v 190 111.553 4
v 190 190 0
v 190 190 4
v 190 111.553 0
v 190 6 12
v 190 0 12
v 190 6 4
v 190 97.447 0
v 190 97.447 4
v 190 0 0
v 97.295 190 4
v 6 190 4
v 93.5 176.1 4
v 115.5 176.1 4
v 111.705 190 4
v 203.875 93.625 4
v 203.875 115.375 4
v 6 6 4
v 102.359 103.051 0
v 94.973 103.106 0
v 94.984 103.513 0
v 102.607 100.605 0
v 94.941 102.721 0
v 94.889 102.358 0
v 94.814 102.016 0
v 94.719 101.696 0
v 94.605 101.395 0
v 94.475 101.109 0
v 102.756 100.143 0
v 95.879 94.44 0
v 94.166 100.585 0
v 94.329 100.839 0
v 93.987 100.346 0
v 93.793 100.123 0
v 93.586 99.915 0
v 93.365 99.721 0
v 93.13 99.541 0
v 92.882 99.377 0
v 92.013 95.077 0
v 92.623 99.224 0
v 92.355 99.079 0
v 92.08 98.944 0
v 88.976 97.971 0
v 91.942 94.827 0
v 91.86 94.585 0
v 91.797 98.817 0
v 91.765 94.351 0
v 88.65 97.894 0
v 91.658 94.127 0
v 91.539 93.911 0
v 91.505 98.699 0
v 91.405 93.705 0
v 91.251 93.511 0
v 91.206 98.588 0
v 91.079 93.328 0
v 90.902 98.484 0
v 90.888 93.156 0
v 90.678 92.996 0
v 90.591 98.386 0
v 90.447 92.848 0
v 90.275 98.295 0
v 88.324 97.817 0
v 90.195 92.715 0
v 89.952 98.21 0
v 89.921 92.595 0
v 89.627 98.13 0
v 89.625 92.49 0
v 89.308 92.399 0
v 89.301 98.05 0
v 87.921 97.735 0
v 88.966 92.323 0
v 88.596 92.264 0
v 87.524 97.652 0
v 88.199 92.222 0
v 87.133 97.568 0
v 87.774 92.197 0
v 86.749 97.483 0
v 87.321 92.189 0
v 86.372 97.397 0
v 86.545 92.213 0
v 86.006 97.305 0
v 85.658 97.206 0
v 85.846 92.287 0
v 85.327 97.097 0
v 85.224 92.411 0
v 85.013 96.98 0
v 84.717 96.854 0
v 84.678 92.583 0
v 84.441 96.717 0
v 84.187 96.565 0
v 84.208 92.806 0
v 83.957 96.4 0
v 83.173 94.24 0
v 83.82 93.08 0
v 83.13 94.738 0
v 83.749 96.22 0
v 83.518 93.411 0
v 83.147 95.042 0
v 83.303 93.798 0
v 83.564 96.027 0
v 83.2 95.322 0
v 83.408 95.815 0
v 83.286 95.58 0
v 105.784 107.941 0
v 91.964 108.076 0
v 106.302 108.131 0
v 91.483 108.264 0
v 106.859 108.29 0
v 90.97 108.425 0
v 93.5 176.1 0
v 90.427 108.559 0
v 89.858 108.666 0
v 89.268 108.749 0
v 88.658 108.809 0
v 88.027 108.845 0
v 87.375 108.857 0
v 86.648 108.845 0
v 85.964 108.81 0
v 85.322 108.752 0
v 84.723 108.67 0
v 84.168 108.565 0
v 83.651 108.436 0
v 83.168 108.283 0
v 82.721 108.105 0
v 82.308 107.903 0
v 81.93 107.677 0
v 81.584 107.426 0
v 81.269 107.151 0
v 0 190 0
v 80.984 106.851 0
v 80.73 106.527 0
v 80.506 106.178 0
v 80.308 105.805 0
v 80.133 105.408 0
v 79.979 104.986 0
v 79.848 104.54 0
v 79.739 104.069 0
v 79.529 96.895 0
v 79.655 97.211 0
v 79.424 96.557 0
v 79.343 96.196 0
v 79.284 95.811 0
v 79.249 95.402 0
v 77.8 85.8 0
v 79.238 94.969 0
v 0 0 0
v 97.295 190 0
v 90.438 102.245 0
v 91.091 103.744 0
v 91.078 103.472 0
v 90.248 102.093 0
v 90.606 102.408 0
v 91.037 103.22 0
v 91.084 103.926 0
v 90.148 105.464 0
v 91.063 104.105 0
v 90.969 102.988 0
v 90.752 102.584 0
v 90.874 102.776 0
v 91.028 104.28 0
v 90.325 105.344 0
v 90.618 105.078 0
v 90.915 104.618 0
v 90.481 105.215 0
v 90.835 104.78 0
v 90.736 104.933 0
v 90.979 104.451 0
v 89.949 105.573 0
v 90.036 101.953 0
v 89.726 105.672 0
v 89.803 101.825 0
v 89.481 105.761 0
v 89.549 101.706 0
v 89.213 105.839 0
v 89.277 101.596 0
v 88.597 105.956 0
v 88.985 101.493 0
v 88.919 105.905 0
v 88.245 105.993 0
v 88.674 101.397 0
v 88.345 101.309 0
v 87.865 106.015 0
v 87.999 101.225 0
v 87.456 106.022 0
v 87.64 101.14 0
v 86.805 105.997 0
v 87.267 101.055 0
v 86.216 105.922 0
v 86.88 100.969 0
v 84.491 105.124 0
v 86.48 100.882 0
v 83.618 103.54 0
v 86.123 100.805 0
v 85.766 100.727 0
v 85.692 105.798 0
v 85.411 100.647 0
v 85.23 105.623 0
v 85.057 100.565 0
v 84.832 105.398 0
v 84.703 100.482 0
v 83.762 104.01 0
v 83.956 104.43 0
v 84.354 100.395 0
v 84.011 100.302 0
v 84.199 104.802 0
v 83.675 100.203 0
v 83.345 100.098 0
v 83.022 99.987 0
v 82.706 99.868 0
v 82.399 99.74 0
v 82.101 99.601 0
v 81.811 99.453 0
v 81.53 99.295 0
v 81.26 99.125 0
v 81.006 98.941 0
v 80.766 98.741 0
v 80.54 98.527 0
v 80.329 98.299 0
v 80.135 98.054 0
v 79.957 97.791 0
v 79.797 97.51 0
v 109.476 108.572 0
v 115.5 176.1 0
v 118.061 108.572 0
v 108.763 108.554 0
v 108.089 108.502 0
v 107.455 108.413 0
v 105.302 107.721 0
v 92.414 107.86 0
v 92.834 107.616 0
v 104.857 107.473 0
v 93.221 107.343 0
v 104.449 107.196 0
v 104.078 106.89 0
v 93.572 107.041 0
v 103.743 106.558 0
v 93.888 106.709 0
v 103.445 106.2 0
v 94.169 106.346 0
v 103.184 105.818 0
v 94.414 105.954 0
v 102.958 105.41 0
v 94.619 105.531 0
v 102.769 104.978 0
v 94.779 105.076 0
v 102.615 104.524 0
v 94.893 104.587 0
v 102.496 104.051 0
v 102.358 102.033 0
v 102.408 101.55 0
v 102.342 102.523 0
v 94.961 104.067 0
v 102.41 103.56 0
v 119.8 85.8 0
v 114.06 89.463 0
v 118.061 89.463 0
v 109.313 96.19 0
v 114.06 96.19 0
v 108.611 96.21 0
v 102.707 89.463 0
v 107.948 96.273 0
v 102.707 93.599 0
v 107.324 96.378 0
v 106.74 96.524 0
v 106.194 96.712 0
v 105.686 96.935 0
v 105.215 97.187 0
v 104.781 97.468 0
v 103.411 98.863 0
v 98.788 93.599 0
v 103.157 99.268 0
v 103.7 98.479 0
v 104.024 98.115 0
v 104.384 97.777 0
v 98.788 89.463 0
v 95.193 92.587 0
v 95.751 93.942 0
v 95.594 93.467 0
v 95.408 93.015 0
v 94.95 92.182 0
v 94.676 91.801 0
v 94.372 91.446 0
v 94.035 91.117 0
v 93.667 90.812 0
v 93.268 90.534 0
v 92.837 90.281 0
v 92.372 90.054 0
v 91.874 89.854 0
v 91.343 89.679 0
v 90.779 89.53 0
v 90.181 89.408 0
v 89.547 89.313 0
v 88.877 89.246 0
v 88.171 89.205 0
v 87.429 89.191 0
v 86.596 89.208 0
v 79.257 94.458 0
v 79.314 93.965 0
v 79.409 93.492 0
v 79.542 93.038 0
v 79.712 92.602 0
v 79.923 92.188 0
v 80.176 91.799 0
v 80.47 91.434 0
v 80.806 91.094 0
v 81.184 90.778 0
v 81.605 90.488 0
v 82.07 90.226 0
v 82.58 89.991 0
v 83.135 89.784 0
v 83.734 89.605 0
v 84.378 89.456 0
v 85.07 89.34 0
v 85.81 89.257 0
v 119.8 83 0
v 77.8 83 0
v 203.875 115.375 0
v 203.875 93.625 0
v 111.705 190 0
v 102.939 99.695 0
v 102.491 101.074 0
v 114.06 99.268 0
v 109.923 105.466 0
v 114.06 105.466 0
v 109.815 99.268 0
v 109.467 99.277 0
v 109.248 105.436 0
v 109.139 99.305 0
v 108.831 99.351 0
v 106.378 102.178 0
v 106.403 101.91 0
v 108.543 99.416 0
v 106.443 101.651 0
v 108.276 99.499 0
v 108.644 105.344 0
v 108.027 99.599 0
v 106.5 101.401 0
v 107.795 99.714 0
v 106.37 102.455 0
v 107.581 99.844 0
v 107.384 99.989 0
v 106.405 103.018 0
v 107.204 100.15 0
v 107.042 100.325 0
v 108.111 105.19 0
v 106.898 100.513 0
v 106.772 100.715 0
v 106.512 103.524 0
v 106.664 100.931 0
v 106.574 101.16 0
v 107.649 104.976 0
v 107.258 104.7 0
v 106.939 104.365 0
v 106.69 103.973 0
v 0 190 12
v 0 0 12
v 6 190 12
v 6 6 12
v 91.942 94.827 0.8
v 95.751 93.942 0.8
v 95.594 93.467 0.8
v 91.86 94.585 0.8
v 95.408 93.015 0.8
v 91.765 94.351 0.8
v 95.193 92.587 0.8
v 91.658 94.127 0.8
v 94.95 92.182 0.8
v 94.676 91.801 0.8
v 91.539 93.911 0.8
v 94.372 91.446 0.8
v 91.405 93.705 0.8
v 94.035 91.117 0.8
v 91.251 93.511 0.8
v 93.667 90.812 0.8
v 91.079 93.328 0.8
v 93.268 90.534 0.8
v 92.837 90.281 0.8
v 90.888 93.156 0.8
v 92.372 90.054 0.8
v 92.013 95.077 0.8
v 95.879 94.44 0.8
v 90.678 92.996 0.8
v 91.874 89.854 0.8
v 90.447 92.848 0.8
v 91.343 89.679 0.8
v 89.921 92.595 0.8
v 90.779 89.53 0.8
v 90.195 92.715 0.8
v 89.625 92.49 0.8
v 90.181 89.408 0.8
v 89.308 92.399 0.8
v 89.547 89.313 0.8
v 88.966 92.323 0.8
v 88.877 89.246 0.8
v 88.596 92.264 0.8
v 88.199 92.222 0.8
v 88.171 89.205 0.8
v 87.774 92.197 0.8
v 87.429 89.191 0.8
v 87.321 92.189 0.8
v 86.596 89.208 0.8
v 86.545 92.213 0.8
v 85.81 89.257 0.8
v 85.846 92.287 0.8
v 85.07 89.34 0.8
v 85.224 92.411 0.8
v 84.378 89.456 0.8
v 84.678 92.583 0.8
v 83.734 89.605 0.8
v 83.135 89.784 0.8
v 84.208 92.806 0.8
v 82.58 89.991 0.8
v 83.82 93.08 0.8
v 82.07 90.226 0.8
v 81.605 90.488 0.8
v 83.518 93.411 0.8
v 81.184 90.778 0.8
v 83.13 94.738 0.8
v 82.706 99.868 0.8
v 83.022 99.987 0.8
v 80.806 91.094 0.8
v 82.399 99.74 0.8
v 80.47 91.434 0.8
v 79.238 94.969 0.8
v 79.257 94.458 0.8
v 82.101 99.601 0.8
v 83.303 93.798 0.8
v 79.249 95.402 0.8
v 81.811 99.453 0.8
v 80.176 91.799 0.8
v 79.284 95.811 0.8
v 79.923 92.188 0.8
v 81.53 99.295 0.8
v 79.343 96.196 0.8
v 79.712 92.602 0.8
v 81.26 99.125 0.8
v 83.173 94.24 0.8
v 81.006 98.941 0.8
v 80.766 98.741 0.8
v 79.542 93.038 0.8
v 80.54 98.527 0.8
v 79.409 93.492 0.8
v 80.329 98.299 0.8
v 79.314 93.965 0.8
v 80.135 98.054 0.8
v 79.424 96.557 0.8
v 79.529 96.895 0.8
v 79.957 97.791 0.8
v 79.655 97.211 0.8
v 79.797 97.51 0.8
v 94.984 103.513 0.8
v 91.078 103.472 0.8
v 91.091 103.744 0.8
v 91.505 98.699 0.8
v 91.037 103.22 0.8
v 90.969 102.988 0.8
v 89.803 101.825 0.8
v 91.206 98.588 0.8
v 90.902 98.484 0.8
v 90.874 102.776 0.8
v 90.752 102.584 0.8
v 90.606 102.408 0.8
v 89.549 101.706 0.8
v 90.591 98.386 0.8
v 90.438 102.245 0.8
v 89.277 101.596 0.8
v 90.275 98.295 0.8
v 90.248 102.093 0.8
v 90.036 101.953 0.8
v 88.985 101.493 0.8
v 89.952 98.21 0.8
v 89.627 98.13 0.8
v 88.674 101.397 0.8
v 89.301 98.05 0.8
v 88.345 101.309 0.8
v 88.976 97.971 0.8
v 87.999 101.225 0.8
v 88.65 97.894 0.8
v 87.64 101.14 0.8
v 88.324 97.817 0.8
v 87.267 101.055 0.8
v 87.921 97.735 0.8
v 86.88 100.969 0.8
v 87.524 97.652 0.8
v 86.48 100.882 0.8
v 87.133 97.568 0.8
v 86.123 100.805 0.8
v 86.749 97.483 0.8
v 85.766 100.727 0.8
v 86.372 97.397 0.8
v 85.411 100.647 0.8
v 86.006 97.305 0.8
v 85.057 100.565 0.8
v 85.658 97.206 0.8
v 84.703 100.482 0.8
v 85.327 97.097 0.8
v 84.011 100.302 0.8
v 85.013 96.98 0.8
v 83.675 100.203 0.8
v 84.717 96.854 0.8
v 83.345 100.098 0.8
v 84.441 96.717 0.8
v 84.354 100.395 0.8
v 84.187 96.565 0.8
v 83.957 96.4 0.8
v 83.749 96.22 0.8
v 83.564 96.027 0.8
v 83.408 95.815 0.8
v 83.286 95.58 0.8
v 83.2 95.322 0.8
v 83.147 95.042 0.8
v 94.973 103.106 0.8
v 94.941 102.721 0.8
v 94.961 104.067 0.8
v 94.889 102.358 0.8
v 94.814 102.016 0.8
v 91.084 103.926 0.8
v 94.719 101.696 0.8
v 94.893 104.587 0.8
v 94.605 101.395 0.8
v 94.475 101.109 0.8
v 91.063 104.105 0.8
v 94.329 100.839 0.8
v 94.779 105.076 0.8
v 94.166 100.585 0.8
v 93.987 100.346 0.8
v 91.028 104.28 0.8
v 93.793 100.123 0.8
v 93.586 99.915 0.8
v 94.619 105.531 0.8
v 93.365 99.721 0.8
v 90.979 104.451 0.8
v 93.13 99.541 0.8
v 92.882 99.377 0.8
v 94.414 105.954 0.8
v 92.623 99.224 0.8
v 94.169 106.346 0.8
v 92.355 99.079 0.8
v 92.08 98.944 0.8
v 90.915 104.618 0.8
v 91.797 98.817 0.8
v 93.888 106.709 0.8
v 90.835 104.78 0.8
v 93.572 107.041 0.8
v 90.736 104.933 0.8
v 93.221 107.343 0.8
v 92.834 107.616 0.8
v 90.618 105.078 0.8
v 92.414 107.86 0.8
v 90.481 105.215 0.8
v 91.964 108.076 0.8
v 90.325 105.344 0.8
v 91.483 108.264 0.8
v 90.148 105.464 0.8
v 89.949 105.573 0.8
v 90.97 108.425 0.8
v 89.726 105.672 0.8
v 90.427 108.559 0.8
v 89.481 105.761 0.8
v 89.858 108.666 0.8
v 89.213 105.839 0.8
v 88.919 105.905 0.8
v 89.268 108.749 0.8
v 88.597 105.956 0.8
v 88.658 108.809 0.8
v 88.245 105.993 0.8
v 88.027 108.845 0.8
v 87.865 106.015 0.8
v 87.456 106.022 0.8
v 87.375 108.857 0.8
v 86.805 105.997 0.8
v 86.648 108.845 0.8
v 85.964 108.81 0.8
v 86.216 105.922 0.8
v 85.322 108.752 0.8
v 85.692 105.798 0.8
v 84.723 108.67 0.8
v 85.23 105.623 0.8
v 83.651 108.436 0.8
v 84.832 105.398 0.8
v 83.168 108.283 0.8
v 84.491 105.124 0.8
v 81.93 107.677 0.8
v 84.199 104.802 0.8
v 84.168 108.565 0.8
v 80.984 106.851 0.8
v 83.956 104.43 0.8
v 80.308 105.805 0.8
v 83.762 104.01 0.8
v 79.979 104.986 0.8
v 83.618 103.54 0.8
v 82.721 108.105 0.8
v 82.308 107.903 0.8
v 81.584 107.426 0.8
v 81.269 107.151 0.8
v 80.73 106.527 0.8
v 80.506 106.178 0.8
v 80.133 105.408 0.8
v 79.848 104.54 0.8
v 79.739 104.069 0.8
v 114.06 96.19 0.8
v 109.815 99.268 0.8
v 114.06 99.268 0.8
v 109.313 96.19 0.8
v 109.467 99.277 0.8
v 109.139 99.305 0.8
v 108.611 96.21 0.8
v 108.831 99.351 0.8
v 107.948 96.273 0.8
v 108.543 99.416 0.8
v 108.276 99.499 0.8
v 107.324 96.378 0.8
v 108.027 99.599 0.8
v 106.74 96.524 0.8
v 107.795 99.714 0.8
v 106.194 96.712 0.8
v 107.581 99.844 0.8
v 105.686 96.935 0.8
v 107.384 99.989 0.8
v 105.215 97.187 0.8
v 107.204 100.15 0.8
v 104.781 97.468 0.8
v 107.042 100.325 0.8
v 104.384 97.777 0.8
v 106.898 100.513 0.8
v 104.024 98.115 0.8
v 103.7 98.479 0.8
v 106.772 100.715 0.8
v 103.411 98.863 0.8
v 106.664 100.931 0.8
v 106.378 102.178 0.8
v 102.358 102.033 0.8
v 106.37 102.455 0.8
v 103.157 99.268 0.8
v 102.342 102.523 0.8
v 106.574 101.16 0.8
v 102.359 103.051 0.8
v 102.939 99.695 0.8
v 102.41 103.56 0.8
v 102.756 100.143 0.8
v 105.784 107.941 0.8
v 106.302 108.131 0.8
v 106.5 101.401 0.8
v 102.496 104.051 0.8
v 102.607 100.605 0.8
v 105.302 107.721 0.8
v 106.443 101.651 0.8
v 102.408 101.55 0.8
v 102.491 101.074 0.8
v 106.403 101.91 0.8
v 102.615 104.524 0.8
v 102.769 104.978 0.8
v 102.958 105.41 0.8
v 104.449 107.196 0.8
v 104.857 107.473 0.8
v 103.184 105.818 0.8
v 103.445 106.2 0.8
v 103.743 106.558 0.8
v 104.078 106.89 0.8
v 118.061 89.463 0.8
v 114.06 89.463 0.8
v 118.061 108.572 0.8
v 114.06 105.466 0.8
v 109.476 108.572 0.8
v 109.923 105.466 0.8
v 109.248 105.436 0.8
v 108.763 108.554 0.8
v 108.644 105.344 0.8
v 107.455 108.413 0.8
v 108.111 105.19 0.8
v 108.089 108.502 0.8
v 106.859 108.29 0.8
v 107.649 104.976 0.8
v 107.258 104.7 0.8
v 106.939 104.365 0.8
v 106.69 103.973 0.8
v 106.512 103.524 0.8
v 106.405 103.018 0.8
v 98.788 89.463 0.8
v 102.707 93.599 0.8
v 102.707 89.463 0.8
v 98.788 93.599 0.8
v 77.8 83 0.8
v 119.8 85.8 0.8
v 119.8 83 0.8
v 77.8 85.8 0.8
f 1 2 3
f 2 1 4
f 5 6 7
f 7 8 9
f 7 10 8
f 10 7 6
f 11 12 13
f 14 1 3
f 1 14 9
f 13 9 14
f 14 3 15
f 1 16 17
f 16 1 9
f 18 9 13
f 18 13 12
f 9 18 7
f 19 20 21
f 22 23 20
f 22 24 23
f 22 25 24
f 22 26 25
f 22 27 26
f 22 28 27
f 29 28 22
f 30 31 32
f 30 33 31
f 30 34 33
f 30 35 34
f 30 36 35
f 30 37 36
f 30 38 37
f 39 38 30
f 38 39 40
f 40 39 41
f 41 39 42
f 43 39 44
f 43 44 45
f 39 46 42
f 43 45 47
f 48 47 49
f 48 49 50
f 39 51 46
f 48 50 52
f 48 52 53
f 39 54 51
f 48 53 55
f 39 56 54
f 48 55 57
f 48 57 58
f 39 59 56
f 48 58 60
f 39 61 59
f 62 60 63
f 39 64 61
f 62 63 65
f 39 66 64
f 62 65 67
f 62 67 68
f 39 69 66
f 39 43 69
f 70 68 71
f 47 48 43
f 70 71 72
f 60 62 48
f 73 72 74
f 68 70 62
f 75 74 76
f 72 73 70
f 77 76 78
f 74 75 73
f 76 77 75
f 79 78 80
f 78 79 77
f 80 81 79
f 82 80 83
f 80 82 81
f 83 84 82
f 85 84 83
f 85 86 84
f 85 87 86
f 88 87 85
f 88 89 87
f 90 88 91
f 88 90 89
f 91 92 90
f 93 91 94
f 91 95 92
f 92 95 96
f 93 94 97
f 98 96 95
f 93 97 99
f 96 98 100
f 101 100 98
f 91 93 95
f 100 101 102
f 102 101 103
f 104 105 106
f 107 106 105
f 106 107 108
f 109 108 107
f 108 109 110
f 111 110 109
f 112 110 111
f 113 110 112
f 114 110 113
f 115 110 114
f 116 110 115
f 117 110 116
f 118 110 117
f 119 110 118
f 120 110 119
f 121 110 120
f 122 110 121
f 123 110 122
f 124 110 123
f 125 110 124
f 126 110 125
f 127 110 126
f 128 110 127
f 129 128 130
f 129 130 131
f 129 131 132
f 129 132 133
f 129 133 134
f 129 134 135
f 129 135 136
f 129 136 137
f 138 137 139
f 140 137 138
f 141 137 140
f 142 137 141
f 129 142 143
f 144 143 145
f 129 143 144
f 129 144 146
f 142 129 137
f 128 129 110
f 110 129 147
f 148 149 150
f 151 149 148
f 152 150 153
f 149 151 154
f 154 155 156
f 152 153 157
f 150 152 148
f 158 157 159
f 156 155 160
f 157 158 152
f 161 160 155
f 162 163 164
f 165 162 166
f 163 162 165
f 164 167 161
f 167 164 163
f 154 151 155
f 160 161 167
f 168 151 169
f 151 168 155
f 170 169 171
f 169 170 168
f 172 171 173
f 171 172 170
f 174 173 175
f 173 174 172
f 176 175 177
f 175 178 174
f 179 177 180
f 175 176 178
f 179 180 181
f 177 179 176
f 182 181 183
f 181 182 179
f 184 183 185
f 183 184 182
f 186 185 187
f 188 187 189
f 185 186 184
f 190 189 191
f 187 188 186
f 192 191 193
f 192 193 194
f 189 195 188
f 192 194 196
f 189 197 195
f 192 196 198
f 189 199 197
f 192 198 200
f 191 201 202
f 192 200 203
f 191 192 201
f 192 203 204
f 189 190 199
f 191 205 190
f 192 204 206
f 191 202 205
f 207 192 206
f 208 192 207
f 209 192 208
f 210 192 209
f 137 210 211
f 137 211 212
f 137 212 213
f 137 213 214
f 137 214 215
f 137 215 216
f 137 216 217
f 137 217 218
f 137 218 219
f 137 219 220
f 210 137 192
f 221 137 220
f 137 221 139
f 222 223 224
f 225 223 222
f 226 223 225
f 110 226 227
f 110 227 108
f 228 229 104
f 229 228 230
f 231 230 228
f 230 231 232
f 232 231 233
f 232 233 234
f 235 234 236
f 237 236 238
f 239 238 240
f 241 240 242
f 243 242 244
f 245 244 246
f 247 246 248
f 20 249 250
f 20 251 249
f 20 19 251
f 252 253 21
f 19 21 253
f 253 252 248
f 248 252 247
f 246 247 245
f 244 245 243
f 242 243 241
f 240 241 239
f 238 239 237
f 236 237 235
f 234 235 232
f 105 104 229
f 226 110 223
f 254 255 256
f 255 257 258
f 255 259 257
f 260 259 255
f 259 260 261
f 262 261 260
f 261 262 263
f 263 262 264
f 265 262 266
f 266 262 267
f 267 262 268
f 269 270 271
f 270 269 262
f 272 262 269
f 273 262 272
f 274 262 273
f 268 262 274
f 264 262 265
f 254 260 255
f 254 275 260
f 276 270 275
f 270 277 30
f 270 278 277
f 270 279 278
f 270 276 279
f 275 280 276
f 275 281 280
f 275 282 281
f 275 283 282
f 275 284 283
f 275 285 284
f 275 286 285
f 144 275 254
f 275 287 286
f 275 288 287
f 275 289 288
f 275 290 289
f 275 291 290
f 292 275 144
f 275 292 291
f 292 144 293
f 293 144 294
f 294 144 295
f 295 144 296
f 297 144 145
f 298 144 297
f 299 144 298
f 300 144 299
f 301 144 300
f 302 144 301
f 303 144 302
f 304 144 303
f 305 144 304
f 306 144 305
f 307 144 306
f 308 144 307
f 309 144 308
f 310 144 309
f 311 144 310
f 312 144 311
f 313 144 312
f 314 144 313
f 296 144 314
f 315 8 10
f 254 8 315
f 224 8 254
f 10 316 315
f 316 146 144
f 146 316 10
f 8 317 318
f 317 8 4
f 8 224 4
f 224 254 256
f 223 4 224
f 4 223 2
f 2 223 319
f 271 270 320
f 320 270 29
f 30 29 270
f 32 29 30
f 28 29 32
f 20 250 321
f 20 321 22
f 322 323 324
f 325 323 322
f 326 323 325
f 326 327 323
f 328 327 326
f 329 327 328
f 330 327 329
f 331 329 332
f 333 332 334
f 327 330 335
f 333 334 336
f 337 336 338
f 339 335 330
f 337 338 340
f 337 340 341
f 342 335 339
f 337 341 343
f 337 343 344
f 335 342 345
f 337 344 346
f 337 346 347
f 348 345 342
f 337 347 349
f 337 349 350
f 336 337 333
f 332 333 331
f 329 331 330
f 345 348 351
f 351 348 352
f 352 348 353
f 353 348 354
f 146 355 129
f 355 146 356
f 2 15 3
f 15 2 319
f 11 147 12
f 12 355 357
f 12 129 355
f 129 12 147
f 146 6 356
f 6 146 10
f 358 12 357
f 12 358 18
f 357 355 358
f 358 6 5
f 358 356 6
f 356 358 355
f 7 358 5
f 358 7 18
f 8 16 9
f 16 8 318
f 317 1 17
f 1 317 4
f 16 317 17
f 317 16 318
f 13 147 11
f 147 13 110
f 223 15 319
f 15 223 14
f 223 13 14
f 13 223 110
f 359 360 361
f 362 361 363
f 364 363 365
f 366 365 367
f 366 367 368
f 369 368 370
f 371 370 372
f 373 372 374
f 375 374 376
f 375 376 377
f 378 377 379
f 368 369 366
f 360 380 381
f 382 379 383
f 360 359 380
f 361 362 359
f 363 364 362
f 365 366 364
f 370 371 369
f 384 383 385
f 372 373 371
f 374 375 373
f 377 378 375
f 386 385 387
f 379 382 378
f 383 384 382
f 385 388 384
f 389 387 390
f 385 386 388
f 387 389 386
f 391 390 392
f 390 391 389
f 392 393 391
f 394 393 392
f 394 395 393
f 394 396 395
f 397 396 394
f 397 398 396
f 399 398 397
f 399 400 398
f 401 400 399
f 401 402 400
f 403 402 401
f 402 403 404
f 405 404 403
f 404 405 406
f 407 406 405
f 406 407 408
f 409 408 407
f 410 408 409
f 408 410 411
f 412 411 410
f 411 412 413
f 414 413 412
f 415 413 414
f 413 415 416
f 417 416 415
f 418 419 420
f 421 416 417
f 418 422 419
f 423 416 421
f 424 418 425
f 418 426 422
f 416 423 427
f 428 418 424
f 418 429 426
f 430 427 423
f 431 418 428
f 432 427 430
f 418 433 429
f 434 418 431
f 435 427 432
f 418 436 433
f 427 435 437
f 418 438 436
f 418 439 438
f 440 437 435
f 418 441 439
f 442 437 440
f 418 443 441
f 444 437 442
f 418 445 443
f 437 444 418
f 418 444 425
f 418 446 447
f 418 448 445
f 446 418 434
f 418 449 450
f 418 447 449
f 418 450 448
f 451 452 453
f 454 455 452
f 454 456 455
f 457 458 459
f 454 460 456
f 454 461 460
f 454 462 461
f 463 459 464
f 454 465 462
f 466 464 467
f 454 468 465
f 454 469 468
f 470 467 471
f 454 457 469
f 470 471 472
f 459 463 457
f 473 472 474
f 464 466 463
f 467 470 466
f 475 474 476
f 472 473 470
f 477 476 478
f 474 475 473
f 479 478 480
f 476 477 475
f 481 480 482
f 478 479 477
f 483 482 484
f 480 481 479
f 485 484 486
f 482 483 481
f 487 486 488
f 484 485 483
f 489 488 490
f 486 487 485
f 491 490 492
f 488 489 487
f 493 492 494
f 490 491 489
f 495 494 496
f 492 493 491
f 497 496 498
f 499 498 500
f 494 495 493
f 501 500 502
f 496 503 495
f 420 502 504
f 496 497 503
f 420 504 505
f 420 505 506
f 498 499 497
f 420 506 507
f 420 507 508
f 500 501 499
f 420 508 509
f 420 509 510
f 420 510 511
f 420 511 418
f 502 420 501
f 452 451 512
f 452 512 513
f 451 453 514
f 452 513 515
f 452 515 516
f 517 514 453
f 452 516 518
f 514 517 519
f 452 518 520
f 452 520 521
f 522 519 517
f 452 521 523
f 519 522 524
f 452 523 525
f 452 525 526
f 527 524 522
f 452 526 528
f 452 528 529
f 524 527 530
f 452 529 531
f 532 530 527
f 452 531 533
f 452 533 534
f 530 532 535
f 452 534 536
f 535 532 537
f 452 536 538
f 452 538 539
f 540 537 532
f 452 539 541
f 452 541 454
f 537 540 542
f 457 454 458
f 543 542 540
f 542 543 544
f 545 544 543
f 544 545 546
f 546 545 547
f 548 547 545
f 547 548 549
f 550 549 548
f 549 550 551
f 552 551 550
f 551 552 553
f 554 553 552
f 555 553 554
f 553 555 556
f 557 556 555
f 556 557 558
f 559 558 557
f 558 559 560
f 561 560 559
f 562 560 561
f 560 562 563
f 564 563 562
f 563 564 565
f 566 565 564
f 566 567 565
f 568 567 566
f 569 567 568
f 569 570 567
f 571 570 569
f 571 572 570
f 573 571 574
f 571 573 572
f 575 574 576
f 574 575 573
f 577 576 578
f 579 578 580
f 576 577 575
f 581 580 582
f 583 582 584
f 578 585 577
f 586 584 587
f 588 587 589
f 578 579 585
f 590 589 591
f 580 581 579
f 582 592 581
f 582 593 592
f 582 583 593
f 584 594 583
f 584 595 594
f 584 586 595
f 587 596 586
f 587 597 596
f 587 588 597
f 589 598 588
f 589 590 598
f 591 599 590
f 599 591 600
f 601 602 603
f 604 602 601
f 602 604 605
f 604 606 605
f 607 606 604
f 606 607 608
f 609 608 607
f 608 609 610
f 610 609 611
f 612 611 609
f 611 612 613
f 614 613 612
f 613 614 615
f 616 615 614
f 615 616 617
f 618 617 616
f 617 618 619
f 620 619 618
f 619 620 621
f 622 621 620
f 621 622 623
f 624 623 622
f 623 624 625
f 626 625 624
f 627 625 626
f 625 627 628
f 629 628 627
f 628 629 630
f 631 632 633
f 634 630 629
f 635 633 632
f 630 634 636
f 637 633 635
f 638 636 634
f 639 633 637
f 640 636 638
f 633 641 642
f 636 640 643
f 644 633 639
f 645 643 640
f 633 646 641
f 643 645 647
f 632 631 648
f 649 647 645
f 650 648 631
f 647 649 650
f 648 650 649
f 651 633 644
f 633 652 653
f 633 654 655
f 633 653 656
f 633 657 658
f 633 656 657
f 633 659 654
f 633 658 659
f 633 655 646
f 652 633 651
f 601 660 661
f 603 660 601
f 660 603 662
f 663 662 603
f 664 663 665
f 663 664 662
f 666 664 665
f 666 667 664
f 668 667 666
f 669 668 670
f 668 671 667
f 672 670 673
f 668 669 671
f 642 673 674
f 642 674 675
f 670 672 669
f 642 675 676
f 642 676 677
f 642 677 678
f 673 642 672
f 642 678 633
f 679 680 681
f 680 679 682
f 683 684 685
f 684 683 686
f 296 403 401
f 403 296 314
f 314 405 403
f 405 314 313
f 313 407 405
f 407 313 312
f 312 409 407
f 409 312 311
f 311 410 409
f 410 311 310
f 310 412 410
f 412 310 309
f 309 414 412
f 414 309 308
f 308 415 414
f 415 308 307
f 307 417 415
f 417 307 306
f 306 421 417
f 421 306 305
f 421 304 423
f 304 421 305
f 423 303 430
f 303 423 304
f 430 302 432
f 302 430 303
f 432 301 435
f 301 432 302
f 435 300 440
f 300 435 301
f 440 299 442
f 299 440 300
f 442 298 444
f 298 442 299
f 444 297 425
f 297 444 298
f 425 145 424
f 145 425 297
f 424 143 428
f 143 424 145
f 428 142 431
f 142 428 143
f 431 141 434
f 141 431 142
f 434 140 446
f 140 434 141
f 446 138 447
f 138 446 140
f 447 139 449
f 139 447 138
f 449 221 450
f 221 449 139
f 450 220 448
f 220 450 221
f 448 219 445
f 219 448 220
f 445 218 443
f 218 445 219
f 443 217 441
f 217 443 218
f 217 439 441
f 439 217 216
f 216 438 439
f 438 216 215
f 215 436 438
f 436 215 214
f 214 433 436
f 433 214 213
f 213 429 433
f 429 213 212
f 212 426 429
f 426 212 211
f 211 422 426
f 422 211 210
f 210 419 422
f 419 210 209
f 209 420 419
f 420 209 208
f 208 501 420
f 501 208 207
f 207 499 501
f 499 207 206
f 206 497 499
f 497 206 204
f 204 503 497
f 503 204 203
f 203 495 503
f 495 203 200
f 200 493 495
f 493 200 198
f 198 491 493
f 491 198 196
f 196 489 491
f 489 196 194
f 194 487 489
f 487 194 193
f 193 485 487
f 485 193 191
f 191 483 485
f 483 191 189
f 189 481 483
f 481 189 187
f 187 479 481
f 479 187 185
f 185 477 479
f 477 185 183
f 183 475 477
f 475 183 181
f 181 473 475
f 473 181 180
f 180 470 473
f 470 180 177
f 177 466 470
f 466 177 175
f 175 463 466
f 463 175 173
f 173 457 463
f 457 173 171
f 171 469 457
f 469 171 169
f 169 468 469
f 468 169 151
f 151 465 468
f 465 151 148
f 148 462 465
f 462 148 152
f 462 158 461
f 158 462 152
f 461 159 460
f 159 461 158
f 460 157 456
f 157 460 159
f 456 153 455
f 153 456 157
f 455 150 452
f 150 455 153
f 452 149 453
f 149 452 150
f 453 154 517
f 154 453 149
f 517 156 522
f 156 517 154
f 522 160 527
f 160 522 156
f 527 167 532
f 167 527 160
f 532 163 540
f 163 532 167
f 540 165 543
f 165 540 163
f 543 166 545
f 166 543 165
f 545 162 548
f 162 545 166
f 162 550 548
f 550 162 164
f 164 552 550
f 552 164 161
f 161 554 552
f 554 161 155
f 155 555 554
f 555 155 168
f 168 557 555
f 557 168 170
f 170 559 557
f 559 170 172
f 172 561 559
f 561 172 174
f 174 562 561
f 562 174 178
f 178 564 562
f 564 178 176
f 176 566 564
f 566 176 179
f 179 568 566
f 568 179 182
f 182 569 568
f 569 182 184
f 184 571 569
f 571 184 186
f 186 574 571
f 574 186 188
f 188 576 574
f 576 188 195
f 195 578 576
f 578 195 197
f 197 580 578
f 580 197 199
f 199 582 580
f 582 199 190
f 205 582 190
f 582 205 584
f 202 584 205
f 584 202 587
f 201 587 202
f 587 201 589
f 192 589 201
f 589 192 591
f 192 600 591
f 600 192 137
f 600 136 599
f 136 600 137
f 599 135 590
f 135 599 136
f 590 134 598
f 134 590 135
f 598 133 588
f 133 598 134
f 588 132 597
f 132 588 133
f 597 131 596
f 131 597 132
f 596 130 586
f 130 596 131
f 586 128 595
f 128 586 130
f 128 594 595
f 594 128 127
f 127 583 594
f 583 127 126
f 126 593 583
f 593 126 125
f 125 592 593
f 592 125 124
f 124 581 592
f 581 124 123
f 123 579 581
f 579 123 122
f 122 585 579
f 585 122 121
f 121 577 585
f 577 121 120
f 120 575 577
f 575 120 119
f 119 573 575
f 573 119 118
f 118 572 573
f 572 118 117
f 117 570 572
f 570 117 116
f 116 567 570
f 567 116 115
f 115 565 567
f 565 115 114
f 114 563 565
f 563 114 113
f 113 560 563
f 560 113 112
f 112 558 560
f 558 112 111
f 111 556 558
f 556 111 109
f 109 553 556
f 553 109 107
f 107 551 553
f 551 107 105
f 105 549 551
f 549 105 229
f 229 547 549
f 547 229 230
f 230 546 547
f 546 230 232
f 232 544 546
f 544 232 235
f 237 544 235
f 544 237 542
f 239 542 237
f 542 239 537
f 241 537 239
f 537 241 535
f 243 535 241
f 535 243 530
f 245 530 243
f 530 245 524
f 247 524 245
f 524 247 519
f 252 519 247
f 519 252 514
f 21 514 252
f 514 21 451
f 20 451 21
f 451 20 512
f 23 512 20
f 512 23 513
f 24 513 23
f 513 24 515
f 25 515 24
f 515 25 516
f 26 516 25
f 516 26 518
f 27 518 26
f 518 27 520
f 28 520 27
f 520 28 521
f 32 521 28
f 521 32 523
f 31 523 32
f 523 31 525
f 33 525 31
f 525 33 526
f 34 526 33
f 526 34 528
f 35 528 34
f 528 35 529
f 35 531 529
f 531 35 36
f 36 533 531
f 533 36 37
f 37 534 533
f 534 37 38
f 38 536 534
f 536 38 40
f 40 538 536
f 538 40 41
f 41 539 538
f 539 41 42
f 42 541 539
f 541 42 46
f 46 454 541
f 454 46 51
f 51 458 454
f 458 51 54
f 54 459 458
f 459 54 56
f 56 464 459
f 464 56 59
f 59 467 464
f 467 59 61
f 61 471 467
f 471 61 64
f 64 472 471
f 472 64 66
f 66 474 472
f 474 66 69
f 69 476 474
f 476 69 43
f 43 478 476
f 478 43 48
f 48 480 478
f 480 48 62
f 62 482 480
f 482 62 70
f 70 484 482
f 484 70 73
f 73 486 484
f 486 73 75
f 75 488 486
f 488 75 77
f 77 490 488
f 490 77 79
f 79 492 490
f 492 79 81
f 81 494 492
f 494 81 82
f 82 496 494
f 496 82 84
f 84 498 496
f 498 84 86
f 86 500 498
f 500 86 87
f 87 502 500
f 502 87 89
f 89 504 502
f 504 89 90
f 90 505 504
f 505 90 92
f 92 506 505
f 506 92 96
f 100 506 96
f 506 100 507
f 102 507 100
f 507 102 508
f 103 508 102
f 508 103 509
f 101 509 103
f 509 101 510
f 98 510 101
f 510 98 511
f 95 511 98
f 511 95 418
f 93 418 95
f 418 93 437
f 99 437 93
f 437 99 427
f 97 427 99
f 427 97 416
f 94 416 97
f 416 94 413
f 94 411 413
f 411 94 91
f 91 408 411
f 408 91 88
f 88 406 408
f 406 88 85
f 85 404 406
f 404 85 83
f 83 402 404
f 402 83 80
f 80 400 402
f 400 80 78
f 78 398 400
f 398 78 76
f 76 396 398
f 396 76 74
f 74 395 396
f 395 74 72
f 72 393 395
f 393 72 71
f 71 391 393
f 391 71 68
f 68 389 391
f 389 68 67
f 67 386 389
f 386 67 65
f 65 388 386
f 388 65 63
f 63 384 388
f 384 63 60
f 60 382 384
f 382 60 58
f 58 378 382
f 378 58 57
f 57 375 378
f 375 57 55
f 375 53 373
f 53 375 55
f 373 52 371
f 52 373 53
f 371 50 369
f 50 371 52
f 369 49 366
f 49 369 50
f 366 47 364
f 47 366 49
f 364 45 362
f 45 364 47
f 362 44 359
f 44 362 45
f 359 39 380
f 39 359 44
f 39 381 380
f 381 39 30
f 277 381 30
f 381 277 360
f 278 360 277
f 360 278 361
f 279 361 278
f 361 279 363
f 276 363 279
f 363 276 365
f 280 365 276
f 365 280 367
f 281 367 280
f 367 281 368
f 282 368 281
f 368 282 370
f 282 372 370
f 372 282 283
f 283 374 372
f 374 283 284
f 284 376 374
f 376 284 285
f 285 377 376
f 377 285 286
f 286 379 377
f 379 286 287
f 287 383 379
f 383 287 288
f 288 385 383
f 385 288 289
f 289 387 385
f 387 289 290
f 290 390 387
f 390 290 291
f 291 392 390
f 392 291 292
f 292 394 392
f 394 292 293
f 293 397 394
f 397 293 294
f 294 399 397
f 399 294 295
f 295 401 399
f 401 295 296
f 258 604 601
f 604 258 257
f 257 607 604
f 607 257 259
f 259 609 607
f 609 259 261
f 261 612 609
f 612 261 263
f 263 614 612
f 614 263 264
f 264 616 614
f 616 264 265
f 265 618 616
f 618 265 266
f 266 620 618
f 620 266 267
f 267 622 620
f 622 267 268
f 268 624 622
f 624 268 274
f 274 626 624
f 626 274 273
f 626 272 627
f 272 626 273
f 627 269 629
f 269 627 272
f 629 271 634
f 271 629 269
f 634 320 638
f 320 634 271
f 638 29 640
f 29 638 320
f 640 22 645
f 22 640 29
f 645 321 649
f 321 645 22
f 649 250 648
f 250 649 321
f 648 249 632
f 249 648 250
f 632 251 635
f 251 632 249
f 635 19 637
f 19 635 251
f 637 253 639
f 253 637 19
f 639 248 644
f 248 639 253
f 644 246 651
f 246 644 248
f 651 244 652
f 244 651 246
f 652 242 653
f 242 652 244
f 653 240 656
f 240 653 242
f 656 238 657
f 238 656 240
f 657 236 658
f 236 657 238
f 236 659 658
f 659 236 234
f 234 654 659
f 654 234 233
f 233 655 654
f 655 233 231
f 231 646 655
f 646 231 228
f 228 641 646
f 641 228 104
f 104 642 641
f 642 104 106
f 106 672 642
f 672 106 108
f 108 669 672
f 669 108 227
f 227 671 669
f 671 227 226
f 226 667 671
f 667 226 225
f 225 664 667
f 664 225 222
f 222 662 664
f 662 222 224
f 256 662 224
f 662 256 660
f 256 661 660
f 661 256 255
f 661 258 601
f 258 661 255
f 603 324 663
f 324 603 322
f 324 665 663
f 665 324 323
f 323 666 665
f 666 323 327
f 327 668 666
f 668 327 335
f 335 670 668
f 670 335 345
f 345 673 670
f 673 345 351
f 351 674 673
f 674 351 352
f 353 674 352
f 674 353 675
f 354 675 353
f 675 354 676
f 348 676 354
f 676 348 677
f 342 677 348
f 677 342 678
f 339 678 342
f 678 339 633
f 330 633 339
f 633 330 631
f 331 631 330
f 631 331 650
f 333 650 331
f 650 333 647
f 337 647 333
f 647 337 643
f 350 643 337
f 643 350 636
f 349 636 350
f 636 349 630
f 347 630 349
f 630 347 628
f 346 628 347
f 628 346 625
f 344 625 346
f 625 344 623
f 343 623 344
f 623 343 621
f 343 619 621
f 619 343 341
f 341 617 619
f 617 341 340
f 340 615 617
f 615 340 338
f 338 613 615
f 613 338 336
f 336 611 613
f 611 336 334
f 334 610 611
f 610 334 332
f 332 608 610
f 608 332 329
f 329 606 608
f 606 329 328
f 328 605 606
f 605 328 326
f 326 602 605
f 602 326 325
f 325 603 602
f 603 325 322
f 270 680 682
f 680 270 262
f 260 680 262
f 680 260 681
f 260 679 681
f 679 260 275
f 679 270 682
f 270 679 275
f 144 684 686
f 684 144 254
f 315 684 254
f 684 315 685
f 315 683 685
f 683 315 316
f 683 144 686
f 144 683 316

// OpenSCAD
// ============================================================================
// P.S (Plastic Shane) — 4-Piece Interlocking Carpet Tray for Flashforge AD5X
// Fits 363x363mm AD5X footprint | Prints on 220x220mm bed | Dual-Colour P.S Logo
// ============================================================================
// HOW TO EXPORT:
//   Set part_to_export = 1 → F6 render → Export as STL → tile1_black.stl
//   Repeat for 2, 3, 4 (all black body)
//   Set part_to_export = 5 → Export as STL → ps_logo_white.stl (white insert)
//
// HOW TO PRINT 2-COLOUR:
//   Drag tile1_black.stl + ps_logo_white.stl into Orca-Flashforge together
//   → "Load as single object with multiple parts?" → YES
//   → Assign black body to Slot 1, white logo to Slot 2
//   → Flushing volume Black→White: 500 mm³
//   → Logo sits face-down on PEI plate, razor-sharp white finish, zero supports
//
// SLICER SETTINGS (AD5X): 0.20mm layer | 4 wall loops | 15% gyroid | no supports
// ============================================================================

$fn = 32;

// --- SELECT WHICH PIECE TO EXPORT ---
// 1 = Front-Left (Base)   | 2 = Front-Right (Base)
// 3 = Back-Left (Base)    | 4 = Back-Right (Base + Cable Notch)
// 5 = "P.S" Logo Insert (Export separately for crisp 2-colour printing!)
part_to_export = 1;

// --- DIMENSIONS (mm) ---
tile_size   = 190;   // 4 tiles = 380x380mm outer tray (368x368mm inner fit for 363mm base)
base_thick  = 4.0;   // Solid base thickness
rim_height  = 12.0;  // Outer lip height to block carpet fluff
rim_thick   = 6.0;   // Outer lip thickness
tab_len     = 14.0;  // Dovetail puzzle tab length
tab_width   = 22.0;  // Dovetail puzzle tab width
clearance   = 0.25;  // Snug friction-fit tolerance for PLA+

// --- REUSABLE "P.S" LOGO STAMP MODULE ---
module ps_logo_stamp(size = 18, depth = 0.8) {
    linear_extrude(height = depth) {
        text("P.S", size = size, font = "Liberation Sans:style=Bold",
             halign = "center", valign = "center", spacing = 1.05);
        translate([0, -size * 0.72, 0])
            square([size * 2.1, size * 0.14], center = true);
    }
}

// --- DOVETAIL PUZZLE CONNECTOR ---
module dovetail(tol = 0) {
    w1 = (tab_width * 0.65) - tol;
    w2 = tab_width - tol;
    l  = tab_len - (tol * 0.5);
    linear_extrude(height = base_thick)
        polygon(points = [
            [-w1/2, -0.1],
            [ w1/2, -0.1],
            [ w2/2,  l],
            [-w2/2,  l]
        ]);
}

// --- SINGLE CORNER TILE GENERATOR ---
module corner_tile(has_cable_notch = false) {
    difference() {
        union() {
            // Main flat floor plate
            cube([tile_size, tile_size, base_thick]);

            // Outer left & bottom raised rims
            cube([rim_thick, tile_size, rim_height]);
            cube([tile_size, rim_thick, rim_height]);

            // Male dovetail tab on right edge
            translate([tile_size, tile_size * 0.55, 0])
                rotate([0, 0, -90])
                    dovetail(clearance);
        }

        // Female dovetail slot on top edge
        translate([tile_size * 0.55, tile_size + 0.1, -0.1])
            rotate([0, 0, 180])
                scale([1, 1, 1.1])
                    dovetail(0);

        // Recessed "P.S" Logo Stamp on the BACK (underside) of every tile
        translate([tile_size * 0.52, tile_size * 0.52, -0.01])
            mirror([1, 0, 0]) // Mirrored so it reads right-way-round when flipped
                ps_logo_stamp(size = 20, depth = 0.81);

        // Optional rear power-cord notch for Back-Right corner
        if (has_cable_notch) {
            translate([tile_size * 0.65, -1, base_thick])
                cube([32, rim_thick + 2, rim_height]);
        }
    }
}

// --- EXPORT CONTROLLER ---
if (part_to_export == 1) corner_tile(false);
if (part_to_export == 2) rotate([0, 0, 90])  corner_tile(false);
if (part_to_export == 3) rotate([0, 0, -90]) corner_tile(false);
if (part_to_export == 4) rotate([0, 0, 180]) corner_tile(true);

// Export #5 as a separate STL to load together with #1-#4 for 2-colour print
if (part_to_export == 5) {
    translate([tile_size * 0.52, tile_size * 0.52, 0])
        mirror([1, 0, 0])
            ps_logo_stamp(size = 20, depth = 0.8);
}
